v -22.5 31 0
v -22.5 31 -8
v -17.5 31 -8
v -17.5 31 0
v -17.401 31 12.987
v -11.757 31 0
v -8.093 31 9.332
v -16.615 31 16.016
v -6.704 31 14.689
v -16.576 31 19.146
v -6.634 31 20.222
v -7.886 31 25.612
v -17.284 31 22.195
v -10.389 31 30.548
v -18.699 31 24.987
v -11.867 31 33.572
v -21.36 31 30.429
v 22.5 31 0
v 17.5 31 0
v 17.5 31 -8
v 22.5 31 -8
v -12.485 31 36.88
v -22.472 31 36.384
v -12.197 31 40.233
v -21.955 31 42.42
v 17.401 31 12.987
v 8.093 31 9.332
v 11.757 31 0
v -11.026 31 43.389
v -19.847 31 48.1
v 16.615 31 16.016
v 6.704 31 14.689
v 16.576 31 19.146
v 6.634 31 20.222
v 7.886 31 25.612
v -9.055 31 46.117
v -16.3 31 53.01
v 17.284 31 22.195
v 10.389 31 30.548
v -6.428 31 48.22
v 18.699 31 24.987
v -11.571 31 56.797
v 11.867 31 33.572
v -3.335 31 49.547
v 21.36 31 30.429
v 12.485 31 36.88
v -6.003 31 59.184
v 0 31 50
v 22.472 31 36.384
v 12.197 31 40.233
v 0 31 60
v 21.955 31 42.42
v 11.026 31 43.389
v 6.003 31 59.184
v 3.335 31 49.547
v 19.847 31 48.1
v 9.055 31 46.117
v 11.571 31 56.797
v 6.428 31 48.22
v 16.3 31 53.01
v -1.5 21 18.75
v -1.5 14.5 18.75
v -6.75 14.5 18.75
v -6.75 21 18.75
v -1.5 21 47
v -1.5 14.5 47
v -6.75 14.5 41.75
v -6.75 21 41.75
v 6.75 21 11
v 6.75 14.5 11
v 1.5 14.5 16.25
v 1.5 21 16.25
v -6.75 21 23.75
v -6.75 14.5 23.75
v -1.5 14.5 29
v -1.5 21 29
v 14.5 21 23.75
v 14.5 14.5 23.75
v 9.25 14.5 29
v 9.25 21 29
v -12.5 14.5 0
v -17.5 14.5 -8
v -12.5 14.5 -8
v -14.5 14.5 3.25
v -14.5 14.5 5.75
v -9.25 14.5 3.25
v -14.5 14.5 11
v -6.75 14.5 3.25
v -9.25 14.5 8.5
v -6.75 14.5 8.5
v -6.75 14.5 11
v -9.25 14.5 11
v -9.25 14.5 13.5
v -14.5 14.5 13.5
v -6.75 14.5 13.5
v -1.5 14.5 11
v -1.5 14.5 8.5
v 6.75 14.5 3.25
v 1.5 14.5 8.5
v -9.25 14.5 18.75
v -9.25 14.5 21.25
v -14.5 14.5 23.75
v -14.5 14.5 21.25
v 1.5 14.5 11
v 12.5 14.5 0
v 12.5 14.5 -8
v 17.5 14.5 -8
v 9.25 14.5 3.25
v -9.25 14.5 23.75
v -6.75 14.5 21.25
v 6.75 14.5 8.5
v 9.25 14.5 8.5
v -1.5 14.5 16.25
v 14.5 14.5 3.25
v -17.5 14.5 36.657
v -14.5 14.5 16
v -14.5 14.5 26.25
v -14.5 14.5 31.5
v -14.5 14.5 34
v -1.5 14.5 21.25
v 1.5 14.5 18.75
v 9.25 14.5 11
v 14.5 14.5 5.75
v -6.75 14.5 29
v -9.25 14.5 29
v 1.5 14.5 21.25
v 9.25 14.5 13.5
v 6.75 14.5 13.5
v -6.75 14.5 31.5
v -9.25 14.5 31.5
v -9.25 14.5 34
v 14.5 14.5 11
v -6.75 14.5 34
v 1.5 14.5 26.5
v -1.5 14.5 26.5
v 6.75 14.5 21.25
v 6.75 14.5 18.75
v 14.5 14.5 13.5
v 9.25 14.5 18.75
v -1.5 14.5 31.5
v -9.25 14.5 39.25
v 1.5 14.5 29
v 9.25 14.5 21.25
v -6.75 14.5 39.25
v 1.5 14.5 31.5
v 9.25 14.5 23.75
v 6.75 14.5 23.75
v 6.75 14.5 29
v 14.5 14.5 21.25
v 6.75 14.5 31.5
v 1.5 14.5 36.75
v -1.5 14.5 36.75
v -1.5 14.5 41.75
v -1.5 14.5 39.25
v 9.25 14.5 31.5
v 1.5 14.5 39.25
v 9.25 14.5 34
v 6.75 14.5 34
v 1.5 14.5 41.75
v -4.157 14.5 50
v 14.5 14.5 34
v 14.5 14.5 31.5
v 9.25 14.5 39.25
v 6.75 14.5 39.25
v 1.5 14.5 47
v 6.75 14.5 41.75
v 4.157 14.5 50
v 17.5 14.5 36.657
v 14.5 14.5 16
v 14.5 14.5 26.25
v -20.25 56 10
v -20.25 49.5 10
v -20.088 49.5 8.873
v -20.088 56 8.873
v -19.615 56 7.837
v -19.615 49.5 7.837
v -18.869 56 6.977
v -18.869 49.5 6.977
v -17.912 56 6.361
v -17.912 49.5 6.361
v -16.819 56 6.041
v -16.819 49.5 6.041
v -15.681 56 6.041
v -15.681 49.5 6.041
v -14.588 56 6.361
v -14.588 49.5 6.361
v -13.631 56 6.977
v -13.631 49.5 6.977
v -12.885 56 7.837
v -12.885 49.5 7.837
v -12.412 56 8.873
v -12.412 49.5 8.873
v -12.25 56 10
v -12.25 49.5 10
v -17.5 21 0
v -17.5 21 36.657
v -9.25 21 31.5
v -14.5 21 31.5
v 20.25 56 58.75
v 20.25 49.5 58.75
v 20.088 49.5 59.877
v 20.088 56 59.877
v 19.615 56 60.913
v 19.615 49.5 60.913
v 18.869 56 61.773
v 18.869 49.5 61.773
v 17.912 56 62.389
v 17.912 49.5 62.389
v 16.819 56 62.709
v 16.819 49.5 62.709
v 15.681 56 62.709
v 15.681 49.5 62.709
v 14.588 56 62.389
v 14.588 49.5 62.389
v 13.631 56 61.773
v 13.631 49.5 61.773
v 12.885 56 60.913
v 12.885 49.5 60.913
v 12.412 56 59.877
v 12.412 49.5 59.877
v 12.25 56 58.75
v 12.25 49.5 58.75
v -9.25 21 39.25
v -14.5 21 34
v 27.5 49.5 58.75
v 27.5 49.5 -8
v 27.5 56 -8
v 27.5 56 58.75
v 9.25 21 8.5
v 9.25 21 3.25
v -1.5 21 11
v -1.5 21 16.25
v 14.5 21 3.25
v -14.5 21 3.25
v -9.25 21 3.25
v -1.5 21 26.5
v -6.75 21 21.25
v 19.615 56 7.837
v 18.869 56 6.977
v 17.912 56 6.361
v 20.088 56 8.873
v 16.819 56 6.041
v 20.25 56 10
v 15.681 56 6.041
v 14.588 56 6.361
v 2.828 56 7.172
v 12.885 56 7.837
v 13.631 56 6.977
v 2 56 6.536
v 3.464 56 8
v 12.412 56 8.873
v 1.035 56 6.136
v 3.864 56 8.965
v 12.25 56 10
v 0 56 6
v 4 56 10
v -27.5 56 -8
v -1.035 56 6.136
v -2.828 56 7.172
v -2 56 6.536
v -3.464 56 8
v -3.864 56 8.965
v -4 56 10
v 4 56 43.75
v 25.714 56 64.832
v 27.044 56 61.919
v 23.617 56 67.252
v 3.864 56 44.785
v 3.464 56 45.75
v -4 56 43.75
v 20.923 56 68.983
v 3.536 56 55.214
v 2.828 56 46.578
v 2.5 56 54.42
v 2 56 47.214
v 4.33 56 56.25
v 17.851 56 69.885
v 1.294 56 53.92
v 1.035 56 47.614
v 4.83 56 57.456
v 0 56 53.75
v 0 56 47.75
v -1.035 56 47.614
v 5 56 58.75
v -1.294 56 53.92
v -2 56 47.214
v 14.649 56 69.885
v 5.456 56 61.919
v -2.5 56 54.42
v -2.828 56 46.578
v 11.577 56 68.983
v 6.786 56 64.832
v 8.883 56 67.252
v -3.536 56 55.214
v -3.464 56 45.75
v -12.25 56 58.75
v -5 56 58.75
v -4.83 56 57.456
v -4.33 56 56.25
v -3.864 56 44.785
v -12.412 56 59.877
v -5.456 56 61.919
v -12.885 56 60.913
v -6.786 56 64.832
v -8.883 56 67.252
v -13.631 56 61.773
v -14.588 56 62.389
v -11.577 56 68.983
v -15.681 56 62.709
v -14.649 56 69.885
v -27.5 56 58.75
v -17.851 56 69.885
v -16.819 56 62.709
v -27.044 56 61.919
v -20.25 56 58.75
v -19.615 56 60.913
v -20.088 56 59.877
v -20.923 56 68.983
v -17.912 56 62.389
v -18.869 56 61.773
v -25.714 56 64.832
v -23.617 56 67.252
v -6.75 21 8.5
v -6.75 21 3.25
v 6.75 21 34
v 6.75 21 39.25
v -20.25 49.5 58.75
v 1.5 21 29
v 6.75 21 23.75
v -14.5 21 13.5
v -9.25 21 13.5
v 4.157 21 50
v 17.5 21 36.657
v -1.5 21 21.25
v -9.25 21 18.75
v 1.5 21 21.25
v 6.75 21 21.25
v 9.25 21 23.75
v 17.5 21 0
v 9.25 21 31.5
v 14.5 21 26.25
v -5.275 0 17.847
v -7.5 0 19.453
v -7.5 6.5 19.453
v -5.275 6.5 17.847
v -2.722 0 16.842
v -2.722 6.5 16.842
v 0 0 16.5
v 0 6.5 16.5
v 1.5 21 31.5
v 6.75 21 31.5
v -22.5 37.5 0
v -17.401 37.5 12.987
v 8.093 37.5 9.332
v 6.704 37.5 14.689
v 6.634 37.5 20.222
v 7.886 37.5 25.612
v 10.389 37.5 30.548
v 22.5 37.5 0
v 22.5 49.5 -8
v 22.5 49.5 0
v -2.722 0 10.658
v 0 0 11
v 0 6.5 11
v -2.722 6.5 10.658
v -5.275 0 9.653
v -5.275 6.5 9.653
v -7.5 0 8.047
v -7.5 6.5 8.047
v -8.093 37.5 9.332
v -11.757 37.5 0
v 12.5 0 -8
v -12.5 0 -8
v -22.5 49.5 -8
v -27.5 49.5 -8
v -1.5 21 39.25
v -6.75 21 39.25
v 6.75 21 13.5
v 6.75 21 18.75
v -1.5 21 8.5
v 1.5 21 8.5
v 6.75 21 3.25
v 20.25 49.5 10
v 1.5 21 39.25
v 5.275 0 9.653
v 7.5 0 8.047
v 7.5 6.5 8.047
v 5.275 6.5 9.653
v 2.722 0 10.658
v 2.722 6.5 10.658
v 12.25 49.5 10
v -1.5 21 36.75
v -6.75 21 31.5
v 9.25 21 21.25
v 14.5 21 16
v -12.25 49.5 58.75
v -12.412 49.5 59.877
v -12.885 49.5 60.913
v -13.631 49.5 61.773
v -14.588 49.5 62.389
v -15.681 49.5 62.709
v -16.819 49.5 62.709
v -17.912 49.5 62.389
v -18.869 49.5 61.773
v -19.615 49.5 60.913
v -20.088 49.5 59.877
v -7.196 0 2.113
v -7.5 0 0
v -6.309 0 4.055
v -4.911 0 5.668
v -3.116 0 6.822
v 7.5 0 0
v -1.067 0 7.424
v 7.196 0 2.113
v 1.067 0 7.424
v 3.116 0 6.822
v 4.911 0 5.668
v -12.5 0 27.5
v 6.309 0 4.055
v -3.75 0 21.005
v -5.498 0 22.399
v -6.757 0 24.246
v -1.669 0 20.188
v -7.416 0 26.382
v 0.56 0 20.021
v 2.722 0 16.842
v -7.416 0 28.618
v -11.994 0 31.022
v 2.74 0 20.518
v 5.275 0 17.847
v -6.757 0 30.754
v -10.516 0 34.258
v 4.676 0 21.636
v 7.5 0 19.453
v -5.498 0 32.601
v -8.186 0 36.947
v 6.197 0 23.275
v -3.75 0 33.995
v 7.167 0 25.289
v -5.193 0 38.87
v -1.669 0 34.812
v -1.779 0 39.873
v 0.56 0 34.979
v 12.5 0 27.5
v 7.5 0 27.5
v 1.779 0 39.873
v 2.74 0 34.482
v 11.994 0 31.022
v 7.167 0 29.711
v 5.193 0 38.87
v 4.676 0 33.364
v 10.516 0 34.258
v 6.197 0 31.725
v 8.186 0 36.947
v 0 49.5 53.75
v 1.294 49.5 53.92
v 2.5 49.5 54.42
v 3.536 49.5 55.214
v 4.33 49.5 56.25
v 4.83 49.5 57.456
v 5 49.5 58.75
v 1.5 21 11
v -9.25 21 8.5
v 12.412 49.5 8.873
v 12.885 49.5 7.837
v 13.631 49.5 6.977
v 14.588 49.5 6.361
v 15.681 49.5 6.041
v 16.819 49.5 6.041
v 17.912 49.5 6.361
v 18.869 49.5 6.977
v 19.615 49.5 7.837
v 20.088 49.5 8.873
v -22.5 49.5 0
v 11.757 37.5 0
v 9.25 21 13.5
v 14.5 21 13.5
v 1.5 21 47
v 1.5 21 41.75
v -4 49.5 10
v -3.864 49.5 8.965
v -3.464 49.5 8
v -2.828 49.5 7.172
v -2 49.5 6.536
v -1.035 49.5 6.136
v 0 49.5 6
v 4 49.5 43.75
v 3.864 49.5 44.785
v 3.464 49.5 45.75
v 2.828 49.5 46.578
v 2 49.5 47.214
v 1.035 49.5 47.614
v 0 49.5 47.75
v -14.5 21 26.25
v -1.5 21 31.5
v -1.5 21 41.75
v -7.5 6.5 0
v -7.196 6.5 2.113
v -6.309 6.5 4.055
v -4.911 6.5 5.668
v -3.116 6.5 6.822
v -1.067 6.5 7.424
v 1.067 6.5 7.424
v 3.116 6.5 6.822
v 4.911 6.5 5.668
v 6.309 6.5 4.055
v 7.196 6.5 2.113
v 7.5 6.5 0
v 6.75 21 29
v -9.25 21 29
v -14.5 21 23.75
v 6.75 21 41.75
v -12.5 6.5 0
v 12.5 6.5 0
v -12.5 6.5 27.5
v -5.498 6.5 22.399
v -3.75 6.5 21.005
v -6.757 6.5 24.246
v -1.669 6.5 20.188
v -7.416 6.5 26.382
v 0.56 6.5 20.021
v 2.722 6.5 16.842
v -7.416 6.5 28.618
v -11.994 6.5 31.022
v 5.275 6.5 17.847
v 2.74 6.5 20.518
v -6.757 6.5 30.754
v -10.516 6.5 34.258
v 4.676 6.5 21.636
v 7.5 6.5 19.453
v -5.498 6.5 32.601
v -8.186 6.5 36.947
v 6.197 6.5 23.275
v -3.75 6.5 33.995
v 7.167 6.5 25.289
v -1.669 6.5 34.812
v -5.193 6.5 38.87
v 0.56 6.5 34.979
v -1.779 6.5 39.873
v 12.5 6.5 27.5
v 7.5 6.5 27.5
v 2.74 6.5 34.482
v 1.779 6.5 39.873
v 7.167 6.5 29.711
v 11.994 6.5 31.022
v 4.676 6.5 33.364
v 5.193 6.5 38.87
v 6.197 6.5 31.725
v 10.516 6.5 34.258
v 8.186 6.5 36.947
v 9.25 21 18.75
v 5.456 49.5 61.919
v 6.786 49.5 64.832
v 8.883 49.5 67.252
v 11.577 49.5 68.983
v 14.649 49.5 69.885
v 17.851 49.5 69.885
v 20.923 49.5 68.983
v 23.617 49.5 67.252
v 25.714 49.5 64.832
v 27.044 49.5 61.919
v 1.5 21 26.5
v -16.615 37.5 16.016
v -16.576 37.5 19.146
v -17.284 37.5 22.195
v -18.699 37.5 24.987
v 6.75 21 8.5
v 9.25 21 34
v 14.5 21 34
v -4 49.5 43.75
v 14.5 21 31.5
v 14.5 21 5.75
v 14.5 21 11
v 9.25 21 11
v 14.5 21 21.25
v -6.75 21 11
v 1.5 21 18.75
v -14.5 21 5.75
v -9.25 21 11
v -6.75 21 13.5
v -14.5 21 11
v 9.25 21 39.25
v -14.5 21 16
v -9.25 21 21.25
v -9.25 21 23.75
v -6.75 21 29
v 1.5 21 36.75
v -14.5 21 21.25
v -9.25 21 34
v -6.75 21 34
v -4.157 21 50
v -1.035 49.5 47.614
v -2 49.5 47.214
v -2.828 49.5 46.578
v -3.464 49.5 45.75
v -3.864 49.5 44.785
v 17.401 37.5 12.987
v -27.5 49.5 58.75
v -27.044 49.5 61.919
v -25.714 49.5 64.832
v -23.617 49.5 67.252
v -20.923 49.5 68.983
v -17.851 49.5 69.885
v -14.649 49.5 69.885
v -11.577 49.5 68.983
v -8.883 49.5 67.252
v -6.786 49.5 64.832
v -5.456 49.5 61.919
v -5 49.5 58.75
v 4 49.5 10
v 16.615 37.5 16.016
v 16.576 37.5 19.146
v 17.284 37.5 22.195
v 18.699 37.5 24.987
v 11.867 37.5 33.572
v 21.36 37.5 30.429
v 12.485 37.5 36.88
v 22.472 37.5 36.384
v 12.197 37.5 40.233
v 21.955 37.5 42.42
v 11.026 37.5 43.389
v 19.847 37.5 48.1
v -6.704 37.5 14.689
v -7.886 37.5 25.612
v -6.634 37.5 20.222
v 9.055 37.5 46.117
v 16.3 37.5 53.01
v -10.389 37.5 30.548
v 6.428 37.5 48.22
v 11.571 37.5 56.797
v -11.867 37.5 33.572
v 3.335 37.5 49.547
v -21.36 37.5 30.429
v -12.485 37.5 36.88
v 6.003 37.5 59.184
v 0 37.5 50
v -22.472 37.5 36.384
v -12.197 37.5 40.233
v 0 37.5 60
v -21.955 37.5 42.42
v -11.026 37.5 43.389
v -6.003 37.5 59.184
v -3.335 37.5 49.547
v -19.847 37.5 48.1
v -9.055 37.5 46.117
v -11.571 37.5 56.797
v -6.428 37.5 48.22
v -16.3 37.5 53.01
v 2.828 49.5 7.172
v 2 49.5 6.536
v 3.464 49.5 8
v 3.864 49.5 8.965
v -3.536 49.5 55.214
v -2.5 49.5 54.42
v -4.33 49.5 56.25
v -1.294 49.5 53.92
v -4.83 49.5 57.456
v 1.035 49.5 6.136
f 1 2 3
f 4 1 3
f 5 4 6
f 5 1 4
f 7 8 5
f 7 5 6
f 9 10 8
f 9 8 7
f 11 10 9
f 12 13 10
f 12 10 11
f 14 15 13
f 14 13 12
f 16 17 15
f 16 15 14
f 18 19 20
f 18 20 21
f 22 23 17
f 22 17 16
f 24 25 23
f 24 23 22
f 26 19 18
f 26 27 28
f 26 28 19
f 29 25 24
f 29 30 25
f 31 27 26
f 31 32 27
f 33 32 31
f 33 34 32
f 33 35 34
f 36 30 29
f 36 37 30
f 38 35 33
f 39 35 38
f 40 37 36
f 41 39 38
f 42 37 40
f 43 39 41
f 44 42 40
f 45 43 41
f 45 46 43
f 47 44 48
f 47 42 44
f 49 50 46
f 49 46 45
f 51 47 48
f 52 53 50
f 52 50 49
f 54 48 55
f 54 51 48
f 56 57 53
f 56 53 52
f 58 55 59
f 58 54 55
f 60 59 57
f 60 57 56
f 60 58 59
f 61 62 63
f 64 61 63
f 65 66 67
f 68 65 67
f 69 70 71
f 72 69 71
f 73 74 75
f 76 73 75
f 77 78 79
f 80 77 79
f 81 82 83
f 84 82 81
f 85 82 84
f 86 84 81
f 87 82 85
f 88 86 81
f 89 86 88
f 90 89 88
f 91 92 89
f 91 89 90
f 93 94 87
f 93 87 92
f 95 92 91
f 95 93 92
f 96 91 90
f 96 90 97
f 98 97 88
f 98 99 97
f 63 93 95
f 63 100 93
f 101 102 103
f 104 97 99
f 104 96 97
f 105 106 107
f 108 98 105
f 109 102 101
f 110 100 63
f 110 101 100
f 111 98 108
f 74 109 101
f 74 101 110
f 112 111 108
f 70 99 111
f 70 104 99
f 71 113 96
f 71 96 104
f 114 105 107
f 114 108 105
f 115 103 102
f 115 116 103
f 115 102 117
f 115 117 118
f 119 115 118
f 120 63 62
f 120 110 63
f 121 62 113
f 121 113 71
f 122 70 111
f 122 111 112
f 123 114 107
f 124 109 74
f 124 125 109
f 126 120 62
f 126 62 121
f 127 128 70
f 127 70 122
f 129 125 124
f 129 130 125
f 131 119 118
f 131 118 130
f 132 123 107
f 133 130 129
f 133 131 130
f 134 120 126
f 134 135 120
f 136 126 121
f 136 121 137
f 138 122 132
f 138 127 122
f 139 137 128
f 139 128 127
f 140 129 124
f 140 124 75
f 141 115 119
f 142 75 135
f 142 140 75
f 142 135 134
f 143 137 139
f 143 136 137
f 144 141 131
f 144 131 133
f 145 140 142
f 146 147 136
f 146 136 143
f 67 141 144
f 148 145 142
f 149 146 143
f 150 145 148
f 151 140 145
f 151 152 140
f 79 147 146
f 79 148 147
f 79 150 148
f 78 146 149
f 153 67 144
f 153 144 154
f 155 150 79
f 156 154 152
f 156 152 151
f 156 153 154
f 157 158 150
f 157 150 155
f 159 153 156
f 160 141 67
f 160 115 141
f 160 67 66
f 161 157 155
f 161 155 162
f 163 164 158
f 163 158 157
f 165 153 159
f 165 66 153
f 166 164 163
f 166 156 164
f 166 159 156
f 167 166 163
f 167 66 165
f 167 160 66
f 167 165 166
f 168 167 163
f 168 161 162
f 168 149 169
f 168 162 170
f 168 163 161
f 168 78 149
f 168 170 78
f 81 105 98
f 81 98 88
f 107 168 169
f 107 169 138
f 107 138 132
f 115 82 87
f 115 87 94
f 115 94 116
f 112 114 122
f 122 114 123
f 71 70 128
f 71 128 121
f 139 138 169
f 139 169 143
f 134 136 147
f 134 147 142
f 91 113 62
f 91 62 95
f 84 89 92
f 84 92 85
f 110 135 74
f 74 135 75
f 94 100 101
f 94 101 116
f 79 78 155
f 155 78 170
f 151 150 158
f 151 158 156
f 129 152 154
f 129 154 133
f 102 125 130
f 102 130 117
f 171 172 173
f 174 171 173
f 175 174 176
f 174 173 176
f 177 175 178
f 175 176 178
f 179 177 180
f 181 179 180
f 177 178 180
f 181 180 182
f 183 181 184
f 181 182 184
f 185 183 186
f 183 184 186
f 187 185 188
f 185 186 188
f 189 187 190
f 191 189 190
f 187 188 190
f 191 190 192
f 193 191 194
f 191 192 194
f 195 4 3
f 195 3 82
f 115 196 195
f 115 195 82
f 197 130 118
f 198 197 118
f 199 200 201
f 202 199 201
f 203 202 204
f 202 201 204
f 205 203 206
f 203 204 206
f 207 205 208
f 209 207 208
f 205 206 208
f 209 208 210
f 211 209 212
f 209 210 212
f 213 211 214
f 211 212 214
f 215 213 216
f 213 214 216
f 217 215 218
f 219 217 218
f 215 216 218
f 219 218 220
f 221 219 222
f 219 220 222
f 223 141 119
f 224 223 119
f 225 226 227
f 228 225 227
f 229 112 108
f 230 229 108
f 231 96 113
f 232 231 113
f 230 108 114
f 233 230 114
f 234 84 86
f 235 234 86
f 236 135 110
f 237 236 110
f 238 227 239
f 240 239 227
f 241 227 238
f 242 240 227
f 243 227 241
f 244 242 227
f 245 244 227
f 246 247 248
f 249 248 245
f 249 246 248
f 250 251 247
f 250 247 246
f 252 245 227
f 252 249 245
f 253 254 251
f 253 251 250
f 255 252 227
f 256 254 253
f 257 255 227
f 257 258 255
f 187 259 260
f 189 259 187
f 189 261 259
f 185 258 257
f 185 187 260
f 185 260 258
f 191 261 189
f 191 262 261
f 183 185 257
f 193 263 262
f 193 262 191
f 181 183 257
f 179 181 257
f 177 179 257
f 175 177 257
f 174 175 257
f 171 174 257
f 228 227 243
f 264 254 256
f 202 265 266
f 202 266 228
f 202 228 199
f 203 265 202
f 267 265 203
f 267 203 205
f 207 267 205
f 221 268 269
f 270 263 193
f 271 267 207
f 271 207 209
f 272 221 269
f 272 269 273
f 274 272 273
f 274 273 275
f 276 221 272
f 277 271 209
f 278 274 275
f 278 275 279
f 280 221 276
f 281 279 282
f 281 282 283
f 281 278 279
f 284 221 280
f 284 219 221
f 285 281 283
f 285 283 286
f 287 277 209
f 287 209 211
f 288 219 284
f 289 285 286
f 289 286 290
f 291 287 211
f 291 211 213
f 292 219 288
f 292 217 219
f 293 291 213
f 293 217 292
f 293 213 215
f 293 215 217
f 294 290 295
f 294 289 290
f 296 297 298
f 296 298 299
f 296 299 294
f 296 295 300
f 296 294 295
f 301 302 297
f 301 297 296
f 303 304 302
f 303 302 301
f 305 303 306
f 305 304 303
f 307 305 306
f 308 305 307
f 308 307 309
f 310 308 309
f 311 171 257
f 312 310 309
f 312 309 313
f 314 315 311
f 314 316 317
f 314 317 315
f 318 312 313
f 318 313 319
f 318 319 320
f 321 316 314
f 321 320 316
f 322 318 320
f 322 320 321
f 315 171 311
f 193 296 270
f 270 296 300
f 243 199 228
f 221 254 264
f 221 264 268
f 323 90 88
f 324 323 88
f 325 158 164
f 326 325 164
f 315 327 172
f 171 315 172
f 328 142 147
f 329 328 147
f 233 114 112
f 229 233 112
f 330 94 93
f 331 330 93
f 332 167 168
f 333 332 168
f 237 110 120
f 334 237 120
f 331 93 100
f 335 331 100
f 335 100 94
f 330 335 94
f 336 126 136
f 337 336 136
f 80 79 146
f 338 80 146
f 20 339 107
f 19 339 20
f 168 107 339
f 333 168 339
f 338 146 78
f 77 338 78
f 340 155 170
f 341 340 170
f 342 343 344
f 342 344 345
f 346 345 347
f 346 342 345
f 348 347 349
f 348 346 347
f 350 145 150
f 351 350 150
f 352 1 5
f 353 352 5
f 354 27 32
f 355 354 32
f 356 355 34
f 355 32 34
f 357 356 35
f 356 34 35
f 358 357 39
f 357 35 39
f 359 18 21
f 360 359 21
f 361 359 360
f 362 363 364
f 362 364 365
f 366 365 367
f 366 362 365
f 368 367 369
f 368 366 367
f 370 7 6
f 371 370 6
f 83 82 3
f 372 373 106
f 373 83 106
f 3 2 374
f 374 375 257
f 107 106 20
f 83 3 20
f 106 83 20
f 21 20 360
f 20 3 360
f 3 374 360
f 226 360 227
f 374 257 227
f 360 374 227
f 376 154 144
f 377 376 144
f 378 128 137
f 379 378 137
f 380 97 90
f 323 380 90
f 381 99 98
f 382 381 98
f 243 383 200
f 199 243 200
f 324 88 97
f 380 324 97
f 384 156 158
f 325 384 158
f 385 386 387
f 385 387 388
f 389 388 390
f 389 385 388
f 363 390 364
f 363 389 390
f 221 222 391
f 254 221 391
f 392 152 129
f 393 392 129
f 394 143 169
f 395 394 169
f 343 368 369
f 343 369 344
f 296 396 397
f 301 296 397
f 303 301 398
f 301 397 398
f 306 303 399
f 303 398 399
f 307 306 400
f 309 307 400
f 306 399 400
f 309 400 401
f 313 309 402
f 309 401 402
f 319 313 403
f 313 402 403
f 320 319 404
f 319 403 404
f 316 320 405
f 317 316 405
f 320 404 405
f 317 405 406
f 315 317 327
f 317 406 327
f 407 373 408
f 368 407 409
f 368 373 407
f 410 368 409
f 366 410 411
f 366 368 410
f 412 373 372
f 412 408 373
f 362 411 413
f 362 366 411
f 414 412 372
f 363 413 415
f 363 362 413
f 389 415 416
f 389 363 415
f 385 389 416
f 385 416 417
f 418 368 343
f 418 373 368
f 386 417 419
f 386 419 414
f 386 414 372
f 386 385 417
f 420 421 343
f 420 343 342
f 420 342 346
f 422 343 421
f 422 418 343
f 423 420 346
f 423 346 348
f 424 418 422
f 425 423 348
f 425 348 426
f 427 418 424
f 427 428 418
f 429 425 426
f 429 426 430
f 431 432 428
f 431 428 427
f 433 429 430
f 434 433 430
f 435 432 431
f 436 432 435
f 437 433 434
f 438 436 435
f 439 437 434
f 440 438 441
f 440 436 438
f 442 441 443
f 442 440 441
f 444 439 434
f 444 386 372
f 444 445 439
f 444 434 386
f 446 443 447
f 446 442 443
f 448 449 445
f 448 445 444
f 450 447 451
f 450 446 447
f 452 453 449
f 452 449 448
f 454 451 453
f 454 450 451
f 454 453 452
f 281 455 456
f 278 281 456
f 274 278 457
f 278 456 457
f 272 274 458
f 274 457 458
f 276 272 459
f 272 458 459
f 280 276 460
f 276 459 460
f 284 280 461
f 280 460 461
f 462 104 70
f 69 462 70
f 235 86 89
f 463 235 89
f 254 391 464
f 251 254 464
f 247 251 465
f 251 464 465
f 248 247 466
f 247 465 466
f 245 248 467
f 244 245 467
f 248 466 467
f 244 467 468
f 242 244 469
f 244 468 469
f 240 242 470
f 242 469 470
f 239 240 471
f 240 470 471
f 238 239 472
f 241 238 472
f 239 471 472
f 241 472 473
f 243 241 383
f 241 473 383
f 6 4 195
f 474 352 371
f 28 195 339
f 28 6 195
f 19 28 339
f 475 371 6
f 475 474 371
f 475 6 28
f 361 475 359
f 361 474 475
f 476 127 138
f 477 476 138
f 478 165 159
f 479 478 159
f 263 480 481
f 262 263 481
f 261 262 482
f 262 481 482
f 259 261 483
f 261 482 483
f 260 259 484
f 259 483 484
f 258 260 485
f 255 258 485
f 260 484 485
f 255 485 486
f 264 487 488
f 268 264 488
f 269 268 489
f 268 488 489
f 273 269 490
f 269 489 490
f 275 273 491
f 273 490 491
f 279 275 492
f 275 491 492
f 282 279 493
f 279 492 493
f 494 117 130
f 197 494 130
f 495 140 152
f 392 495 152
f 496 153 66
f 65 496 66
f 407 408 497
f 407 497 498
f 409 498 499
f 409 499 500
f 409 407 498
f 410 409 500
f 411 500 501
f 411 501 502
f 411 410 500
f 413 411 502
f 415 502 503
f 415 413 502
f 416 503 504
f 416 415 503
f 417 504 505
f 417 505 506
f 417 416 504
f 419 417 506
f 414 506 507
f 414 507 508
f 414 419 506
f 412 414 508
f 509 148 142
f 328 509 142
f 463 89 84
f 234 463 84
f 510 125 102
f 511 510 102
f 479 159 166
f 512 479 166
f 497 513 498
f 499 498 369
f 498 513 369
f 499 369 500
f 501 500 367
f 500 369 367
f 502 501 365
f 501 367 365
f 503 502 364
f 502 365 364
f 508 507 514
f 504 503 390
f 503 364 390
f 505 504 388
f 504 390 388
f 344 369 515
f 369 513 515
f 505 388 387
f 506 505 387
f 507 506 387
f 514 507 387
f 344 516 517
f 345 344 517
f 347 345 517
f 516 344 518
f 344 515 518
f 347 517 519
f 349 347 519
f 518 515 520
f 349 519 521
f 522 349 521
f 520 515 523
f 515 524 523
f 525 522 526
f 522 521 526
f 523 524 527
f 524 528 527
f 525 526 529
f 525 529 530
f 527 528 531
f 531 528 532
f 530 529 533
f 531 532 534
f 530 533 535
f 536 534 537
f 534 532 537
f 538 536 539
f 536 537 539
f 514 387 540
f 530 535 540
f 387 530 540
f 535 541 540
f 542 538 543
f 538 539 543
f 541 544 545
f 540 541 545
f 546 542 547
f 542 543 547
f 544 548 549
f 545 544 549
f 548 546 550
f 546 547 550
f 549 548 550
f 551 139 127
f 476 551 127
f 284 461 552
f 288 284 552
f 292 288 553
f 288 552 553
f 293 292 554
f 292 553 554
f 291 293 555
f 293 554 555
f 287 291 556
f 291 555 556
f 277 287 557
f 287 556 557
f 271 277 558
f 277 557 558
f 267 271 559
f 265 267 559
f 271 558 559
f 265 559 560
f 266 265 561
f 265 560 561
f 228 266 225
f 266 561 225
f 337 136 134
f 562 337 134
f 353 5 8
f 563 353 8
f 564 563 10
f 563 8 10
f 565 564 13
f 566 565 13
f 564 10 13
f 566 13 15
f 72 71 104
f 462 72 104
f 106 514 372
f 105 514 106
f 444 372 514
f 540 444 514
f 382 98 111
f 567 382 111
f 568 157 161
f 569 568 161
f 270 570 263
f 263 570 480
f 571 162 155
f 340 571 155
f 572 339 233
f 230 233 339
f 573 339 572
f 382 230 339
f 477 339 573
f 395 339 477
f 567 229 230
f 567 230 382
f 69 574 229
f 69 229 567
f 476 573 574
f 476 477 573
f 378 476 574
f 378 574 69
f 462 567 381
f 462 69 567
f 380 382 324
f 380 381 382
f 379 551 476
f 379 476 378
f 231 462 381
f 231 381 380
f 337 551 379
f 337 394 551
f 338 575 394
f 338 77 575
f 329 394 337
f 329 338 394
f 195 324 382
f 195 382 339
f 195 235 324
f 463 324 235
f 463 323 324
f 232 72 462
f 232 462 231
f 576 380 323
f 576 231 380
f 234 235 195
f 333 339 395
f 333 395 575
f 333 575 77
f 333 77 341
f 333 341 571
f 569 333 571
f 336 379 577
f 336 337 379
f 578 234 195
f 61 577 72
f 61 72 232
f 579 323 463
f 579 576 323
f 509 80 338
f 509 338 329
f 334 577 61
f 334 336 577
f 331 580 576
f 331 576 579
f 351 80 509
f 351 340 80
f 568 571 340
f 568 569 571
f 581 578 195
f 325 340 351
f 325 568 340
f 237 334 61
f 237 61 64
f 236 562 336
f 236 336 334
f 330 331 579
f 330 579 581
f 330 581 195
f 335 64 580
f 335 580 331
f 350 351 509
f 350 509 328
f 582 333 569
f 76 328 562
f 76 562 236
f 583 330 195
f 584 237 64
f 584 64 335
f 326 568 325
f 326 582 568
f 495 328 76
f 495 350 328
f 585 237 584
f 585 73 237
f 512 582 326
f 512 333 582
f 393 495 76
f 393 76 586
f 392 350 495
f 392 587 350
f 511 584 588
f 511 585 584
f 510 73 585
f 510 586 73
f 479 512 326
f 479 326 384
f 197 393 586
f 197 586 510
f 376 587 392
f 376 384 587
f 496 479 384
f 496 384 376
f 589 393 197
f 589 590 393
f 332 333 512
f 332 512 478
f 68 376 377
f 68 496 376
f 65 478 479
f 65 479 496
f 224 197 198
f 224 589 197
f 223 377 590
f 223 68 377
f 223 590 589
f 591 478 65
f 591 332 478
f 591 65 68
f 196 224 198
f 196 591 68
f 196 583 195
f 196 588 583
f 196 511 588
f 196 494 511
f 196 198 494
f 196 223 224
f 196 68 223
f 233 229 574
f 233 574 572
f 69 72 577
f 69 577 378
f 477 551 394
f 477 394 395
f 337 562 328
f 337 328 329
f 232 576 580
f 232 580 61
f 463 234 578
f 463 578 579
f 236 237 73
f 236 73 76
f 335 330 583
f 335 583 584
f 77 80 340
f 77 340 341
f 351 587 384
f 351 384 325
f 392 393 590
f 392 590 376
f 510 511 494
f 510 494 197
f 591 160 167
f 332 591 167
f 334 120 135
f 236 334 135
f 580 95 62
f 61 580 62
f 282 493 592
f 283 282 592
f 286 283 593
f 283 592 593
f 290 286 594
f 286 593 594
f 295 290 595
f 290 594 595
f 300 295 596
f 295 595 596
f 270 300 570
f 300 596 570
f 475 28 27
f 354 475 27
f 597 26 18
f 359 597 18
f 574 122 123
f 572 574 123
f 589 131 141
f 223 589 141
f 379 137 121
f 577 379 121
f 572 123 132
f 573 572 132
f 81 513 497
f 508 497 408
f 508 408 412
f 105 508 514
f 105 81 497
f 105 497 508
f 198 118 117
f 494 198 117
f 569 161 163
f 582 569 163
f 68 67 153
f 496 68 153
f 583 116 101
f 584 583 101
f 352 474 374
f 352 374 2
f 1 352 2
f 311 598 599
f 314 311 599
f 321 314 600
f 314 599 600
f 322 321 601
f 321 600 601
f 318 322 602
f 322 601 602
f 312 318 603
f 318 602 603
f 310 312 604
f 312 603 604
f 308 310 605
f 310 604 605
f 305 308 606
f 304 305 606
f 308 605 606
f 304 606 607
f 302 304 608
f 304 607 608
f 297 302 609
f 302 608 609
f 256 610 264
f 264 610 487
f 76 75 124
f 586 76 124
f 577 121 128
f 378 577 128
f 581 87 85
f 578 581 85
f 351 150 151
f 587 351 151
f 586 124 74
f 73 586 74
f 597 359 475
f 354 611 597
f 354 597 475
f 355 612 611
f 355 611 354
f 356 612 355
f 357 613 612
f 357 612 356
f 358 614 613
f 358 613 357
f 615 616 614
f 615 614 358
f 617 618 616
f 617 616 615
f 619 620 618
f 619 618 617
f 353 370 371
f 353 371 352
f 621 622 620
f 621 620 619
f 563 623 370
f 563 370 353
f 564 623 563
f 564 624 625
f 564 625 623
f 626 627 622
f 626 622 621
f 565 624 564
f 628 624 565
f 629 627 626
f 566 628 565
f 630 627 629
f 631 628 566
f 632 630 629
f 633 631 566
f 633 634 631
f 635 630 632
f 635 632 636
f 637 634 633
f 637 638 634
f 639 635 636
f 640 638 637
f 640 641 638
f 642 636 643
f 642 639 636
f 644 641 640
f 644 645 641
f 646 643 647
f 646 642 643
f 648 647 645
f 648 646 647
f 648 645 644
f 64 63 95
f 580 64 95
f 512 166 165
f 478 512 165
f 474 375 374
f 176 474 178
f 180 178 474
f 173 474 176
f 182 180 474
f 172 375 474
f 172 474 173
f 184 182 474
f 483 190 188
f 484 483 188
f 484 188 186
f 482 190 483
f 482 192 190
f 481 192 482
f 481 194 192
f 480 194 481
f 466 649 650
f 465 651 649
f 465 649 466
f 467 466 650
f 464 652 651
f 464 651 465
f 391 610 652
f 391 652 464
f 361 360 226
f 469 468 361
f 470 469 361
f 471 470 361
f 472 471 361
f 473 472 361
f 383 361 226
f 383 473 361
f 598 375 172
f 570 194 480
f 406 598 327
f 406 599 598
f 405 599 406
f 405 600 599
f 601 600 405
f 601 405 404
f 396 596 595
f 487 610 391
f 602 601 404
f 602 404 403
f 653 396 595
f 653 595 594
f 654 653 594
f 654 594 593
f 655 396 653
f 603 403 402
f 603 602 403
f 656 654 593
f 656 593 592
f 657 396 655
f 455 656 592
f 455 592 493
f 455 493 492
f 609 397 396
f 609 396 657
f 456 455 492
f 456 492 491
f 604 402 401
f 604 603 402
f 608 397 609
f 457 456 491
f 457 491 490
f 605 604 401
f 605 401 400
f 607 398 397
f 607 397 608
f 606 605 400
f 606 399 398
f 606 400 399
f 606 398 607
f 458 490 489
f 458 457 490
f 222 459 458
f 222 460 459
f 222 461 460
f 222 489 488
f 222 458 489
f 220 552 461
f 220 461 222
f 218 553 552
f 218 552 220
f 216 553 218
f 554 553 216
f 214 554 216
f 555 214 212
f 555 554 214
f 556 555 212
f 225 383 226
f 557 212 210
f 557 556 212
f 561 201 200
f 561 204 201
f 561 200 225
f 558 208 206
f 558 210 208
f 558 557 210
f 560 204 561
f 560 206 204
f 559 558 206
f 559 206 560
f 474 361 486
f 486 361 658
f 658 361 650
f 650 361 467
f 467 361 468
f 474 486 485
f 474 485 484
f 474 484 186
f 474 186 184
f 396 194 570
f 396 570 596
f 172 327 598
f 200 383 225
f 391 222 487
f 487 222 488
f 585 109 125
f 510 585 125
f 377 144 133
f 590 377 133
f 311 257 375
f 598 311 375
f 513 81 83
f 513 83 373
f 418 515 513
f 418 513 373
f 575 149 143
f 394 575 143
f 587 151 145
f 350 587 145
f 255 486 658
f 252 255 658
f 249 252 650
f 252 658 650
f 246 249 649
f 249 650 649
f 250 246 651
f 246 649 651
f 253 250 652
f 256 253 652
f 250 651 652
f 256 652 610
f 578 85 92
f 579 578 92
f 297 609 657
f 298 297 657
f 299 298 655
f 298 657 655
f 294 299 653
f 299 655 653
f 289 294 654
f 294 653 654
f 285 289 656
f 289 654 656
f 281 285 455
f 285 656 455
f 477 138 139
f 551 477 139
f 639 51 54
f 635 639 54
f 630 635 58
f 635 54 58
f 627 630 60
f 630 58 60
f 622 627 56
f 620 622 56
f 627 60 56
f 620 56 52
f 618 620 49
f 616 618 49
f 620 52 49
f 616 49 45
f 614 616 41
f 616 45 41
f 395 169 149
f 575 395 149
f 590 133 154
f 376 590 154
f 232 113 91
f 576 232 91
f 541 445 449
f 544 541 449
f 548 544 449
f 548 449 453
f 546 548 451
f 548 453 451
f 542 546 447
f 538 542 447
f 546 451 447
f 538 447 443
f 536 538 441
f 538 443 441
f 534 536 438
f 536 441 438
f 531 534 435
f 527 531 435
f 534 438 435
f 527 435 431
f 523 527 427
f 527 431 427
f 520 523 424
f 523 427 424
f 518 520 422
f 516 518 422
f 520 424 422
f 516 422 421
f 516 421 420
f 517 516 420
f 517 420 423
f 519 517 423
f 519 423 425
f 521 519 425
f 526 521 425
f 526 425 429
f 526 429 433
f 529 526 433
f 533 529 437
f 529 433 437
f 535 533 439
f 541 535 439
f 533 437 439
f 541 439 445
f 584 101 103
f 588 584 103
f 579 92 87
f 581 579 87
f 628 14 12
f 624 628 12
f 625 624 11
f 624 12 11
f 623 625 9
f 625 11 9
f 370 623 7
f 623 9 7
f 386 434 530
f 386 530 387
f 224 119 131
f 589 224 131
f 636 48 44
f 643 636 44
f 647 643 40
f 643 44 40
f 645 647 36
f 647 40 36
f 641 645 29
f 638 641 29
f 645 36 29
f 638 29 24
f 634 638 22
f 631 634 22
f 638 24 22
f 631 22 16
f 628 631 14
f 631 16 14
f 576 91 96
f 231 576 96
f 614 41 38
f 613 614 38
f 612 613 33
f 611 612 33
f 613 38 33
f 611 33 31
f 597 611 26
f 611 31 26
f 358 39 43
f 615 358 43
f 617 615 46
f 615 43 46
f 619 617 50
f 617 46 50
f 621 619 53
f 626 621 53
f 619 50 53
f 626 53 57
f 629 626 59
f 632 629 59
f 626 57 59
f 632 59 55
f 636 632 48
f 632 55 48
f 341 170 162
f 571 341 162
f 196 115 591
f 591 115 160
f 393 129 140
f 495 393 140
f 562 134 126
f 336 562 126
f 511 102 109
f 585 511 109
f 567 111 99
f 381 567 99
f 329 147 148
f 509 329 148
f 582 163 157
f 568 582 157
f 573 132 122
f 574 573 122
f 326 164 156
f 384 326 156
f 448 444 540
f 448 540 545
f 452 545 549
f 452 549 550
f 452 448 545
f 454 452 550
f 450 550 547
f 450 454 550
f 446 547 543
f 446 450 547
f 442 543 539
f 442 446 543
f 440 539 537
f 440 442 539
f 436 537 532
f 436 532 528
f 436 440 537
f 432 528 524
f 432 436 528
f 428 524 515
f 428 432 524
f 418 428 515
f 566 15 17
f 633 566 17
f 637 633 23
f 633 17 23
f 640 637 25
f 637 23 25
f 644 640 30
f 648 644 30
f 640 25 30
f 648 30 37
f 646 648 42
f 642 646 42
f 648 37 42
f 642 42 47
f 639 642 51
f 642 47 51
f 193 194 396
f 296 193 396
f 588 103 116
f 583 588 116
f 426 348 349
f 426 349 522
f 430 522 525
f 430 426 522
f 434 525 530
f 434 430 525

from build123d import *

# Parameters (mm, degrees)
F0_R      = 7.5
F1_DEPTH  = 6.5
F4_DEPTH  = 6.5
F7_DEPTH  = 6.5
F10_DEPTH = 6.5
F12_DEPTH = 8


with BuildPart() as f1:
    # F0 (on Front) → F1 (new body)
    with BuildSketch(Plane.XZ):
        with BuildLine():
            Line((-12.5, 27.5), (-12.5, 0))
            Line((-12.5, 0), (-7.5, 0))
            ThreePointArc((-7.5, 0), (0, 7.5), (7.5, 0))
            Line((7.5, 0), (12.5, 0))
            Line((12.5, 0), (12.5, 27.5))
            ThreePointArc((12.5, 27.5), (0, 40), (-12.5, 27.5))
        make_face()
        with BuildLine():
            Line((-7.5, 13.75), (-7.5, 19.4532615303))
            ThreePointArc((-7.5, 19.4532615303), (-4.0302528973, 17.2649102797), (0, 16.5))
            ThreePointArc((0, 16.5), (4.0302528973, 17.2649102797), (7.5, 19.4532615303))
            Line((7.5, 19.4532615303), (7.5, 13.75))
            Line((7.5, 13.75), (7.5, 8.0467384697))
            ThreePointArc((7.5, 8.0467384697), (4.0302528973, 10.2350897203), (0, 11))
            ThreePointArc((0, 11), (-4.0302528973, 10.2350897203), (-7.5, 8.0467384697))
            Line((-7.5, 8.0467384697), (-7.5, 13.75))
        make_face(mode=Mode.SUBTRACT)
        with Locations((0, 27.5)):
            Circle(F0_R, mode=Mode.SUBTRACT)
    extrude(amount=-F1_DEPTH)



with BuildPart() as f4:
    # F3 (on offset) → F4 (new body)
    with BuildSketch(Plane(origin=(0, 14.5, 0), x_dir=(-1, 0, 0), z_dir=(0, 1, 0))):
        Polygon((-17.5, 0), (17.5, 0), (17.5, 36.6568542495), (4.1568542495, 50), (0, 50), (-4.1568542495, 50), (-17.5, 36.6568542495), align=None)
        Polygon((-14.5, 3.25), (-9.25, 8.5), (-9.25, 3.25), align=None, mode=Mode.SUBTRACT)
        Polygon((-14.5, 11), (-9.25, 11), (-14.5, 5.75), align=None, mode=Mode.SUBTRACT)
        Polygon((-6.75, 3.25), (-6.75, 8.5), (-1.5, 8.5), align=None, mode=Mode.SUBTRACT)
        Polygon((-14.5, 13.5), (-9.25, 18.75), (-9.25, 13.5), align=None, mode=Mode.SUBTRACT)
        Polygon((-14.5, 21.25), (-9.25, 21.25), (-14.5, 16), align=None, mode=Mode.SUBTRACT)
        Polygon((-6.75, 11), (-1.5, 16.25), (-1.5, 11), align=None, mode=Mode.SUBTRACT)
        Polygon((-6.75, 13.5), (-6.75, 18.75), (-1.5, 18.75), align=None, mode=Mode.SUBTRACT)
        Polygon((-6.75, 21.25), (-1.5, 26.5), (-1.5, 21.25), align=None, mode=Mode.SUBTRACT)
        Polygon((6.75, 8.5), (6.75, 3.25), (1.5, 8.5), align=None, mode=Mode.SUBTRACT)
        Polygon((9.25, 8.5), (14.5, 3.25), (9.25, 3.25), align=None, mode=Mode.SUBTRACT)
        Polygon((14.5, 5.75), (9.25, 11), (14.5, 11), align=None, mode=Mode.SUBTRACT)
        Polygon((1.5, 11), (1.5, 16.25), (6.75, 11), align=None, mode=Mode.SUBTRACT)
        Polygon((1.5, 18.75), (6.75, 18.75), (6.75, 13.5), align=None, mode=Mode.SUBTRACT)
        Polygon((1.5, 21.25), (1.5, 26.5), (6.75, 21.25), align=None, mode=Mode.SUBTRACT)
        Polygon((9.25, 13.5), (9.25, 18.75), (14.5, 13.5), align=None, mode=Mode.SUBTRACT)
        Polygon((14.5, 16), (9.25, 21.25), (14.5, 21.25), align=None, mode=Mode.SUBTRACT)
        Polygon((-14.5, 23.75), (-9.25, 29), (-9.25, 23.75), align=None, mode=Mode.SUBTRACT)
        Polygon((-14.5, 31.5), (-9.25, 31.5), (-14.5, 26.25), align=None, mode=Mode.SUBTRACT)
        Polygon((-14.5, 34), (-9.25, 39.25), (-9.25, 34), align=None, mode=Mode.SUBTRACT)
        Polygon((-6.75, 23.75), (-6.75, 29), (-1.5, 29), align=None, mode=Mode.SUBTRACT)
        Polygon((-6.75, 31.5), (-1.5, 36.75), (-1.5, 31.5), align=None, mode=Mode.SUBTRACT)
        Polygon((-6.75, 34), (-6.75, 39.25), (-1.5, 39.25), align=None, mode=Mode.SUBTRACT)
        Polygon((-1.5, 41.75), (-6.75, 41.75), (-1.5, 47), align=None, mode=Mode.SUBTRACT)
        Polygon((1.5, 29), (6.75, 29), (6.75, 23.75), align=None, mode=Mode.SUBTRACT)
        Polygon((1.5, 31.5), (1.5, 36.75), (6.75, 31.5), align=None, mode=Mode.SUBTRACT)
        Polygon((1.5, 39.25), (6.75, 39.25), (6.75, 34), align=None, mode=Mode.SUBTRACT)
        Polygon((9.25, 23.75), (9.25, 29), (14.5, 23.75), align=None, mode=Mode.SUBTRACT)
        Polygon((14.5, 26.25), (9.25, 31.5), (14.5, 31.5), align=None, mode=Mode.SUBTRACT)
        Polygon((9.25, 34), (9.25, 39.25), (14.5, 34), align=None, mode=Mode.SUBTRACT)
        Polygon((1.5, 41.75), (1.5, 47), (6.75, 41.75), align=None, mode=Mode.SUBTRACT)
    extrude(amount=F4_DEPTH)


with BuildPart() as f7:
    # F6 (on offset) → F7 (new body)
    with BuildSketch(Plane(origin=(0, 31, 0), x_dir=(-1, 0, 0), z_dir=(0, 1, 0))):
        with BuildLine():
            ThreePointArc((18.6993614774, 24.9866519133), (19.8469182992, 48.099520462), (0, 60))
            ThreePointArc((0, 60), (-19.8469182992, 48.099520462), (-18.6993614774, 24.9866519133))
            ThreePointArc((-18.6993614774, 24.9866519133), (-16.5755735728, 19.1462143394), (-17.4007867797, 12.9866519133))
            Line((-17.4007867797, 12.9866519133), (-22.5, 0))
            Line((-22.5, 0), (-11.756749629, 0))
            Line((-11.756749629, 0), (-8.0926168547, 9.3317958769))
            ThreePointArc((-8.0926168547, 9.3317958769), (-6.6336162435, 20.2220788589), (-10.3885341541, 30.5481399518))
            ThreePointArc((-10.3885341541, 30.5481399518), (-11.0260657218, 43.3886224789), (0, 50))
            ThreePointArc((0, 50), (11.0260657218, 43.3886224789), (10.3885341541, 30.5481399518))
            ThreePointArc((10.3885341541, 30.5481399518), (6.6336162435, 20.2220788589), (8.0926168547, 9.3317958769))
            Line((8.0926168547, 9.3317958769), (11.756749629, 0))
            Line((11.756749629, 0), (22.5, 0))
            Line((22.5, 0), (17.4007867797, 12.9866519133))
            ThreePointArc((17.4007867797, 12.9866519133), (16.5755735728, 19.1462143394), (18.6993614774, 24.9866519133))
        make_face()
    extrude(amount=F7_DEPTH)


with BuildPart() as f10:
    # F9 (on offset) → F10 (new body)
    with BuildSketch(Plane(origin=(0, 49.5, 0), x_dir=(-1, 0, 0), z_dir=(0, 1, 0))):
        with BuildLine():
            Line((-27.5, 0), (27.5, 0))
            Line((27.5, 0), (27.5, 58.75))
            ThreePointArc((27.5, 58.75), (16.25, 70), (5, 58.75))
            ThreePointArc((5, 58.75), (3.5355339059, 55.2144660941), (0, 53.75))
            ThreePointArc((0, 53.75), (-3.5355339059, 55.2144660941), (-5, 58.75))
            ThreePointArc((-5, 58.75), (-16.25, 70), (-27.5, 58.75))
            Line((-27.5, 58.75), (-27.5, 0))
        make_face()
        with BuildLine():
            ThreePointArc((-20.25, 58.75), (-16.25, 62.75), (-12.25, 58.75))
            Line((-12.25, 58.75), (-12.25, 10))
            ThreePointArc((-12.25, 10), (-16.25, 6), (-20.25, 10))
            Line((-20.25, 10), (-20.25, 58.75))
        make_face(mode=Mode.SUBTRACT)
        with BuildLine():
            ThreePointArc((-4, 43.75), (-2.8284271247, 46.5784271247), (0, 47.75))
            ThreePointArc((0, 47.75), (2.8284271247, 46.5784271247), (4, 43.75))
            Line((4, 43.75), (4, 10))
            ThreePointArc((4, 10), (2.8284271247, 7.1715728753), (0, 6))
            ThreePointArc((0, 6), (-2.8284271247, 7.1715728753), (-4, 10))
            Line((-4, 10), (-4, 43.75))
        make_face(mode=Mode.SUBTRACT)
        with BuildLine():
            ThreePointArc((12.25, 58.75), (16.25, 62.75), (20.25, 58.75))
            Line((20.25, 58.75), (20.25, 10))
            ThreePointArc((20.25, 10), (16.25, 6), (12.25, 10))
            Line((12.25, 10), (12.25, 58.75))
        make_face(mode=Mode.SUBTRACT)
    extrude(amount=F10_DEPTH)


with BuildPart() as f1_1:
    add(f1.part)

    add(f4.part)  # F12 merges F4

    add(f7.part)  # F12 merges F7

    add(f10.part)  # F12 merges F10
    # F11 (on Top) → F12 (join)
    with BuildSketch(Plane.XY):
        Polygon((-12.5, 0), (0, 0), (12.5, 0), (12.5, 6.5), (12.5, 14.5), (17.5, 14.5), (17.5, 21), (17.5, 31), (22.5, 31), (22.5, 37.5), (22.5, 49.5), (27.5, 49.5), (27.5, 56), (0, 56), (-27.5, 56), (-27.5, 49.5), (-22.5, 49.5), (-22.5, 37.5), (-22.5, 31), (-17.5, 31), (-17.5, 21), (-17.5, 14.5), (-12.5, 14.5), (-12.5, 6.5), align=None)
    extrude(amount=-F12_DEPTH)


solid = f1_1.part
